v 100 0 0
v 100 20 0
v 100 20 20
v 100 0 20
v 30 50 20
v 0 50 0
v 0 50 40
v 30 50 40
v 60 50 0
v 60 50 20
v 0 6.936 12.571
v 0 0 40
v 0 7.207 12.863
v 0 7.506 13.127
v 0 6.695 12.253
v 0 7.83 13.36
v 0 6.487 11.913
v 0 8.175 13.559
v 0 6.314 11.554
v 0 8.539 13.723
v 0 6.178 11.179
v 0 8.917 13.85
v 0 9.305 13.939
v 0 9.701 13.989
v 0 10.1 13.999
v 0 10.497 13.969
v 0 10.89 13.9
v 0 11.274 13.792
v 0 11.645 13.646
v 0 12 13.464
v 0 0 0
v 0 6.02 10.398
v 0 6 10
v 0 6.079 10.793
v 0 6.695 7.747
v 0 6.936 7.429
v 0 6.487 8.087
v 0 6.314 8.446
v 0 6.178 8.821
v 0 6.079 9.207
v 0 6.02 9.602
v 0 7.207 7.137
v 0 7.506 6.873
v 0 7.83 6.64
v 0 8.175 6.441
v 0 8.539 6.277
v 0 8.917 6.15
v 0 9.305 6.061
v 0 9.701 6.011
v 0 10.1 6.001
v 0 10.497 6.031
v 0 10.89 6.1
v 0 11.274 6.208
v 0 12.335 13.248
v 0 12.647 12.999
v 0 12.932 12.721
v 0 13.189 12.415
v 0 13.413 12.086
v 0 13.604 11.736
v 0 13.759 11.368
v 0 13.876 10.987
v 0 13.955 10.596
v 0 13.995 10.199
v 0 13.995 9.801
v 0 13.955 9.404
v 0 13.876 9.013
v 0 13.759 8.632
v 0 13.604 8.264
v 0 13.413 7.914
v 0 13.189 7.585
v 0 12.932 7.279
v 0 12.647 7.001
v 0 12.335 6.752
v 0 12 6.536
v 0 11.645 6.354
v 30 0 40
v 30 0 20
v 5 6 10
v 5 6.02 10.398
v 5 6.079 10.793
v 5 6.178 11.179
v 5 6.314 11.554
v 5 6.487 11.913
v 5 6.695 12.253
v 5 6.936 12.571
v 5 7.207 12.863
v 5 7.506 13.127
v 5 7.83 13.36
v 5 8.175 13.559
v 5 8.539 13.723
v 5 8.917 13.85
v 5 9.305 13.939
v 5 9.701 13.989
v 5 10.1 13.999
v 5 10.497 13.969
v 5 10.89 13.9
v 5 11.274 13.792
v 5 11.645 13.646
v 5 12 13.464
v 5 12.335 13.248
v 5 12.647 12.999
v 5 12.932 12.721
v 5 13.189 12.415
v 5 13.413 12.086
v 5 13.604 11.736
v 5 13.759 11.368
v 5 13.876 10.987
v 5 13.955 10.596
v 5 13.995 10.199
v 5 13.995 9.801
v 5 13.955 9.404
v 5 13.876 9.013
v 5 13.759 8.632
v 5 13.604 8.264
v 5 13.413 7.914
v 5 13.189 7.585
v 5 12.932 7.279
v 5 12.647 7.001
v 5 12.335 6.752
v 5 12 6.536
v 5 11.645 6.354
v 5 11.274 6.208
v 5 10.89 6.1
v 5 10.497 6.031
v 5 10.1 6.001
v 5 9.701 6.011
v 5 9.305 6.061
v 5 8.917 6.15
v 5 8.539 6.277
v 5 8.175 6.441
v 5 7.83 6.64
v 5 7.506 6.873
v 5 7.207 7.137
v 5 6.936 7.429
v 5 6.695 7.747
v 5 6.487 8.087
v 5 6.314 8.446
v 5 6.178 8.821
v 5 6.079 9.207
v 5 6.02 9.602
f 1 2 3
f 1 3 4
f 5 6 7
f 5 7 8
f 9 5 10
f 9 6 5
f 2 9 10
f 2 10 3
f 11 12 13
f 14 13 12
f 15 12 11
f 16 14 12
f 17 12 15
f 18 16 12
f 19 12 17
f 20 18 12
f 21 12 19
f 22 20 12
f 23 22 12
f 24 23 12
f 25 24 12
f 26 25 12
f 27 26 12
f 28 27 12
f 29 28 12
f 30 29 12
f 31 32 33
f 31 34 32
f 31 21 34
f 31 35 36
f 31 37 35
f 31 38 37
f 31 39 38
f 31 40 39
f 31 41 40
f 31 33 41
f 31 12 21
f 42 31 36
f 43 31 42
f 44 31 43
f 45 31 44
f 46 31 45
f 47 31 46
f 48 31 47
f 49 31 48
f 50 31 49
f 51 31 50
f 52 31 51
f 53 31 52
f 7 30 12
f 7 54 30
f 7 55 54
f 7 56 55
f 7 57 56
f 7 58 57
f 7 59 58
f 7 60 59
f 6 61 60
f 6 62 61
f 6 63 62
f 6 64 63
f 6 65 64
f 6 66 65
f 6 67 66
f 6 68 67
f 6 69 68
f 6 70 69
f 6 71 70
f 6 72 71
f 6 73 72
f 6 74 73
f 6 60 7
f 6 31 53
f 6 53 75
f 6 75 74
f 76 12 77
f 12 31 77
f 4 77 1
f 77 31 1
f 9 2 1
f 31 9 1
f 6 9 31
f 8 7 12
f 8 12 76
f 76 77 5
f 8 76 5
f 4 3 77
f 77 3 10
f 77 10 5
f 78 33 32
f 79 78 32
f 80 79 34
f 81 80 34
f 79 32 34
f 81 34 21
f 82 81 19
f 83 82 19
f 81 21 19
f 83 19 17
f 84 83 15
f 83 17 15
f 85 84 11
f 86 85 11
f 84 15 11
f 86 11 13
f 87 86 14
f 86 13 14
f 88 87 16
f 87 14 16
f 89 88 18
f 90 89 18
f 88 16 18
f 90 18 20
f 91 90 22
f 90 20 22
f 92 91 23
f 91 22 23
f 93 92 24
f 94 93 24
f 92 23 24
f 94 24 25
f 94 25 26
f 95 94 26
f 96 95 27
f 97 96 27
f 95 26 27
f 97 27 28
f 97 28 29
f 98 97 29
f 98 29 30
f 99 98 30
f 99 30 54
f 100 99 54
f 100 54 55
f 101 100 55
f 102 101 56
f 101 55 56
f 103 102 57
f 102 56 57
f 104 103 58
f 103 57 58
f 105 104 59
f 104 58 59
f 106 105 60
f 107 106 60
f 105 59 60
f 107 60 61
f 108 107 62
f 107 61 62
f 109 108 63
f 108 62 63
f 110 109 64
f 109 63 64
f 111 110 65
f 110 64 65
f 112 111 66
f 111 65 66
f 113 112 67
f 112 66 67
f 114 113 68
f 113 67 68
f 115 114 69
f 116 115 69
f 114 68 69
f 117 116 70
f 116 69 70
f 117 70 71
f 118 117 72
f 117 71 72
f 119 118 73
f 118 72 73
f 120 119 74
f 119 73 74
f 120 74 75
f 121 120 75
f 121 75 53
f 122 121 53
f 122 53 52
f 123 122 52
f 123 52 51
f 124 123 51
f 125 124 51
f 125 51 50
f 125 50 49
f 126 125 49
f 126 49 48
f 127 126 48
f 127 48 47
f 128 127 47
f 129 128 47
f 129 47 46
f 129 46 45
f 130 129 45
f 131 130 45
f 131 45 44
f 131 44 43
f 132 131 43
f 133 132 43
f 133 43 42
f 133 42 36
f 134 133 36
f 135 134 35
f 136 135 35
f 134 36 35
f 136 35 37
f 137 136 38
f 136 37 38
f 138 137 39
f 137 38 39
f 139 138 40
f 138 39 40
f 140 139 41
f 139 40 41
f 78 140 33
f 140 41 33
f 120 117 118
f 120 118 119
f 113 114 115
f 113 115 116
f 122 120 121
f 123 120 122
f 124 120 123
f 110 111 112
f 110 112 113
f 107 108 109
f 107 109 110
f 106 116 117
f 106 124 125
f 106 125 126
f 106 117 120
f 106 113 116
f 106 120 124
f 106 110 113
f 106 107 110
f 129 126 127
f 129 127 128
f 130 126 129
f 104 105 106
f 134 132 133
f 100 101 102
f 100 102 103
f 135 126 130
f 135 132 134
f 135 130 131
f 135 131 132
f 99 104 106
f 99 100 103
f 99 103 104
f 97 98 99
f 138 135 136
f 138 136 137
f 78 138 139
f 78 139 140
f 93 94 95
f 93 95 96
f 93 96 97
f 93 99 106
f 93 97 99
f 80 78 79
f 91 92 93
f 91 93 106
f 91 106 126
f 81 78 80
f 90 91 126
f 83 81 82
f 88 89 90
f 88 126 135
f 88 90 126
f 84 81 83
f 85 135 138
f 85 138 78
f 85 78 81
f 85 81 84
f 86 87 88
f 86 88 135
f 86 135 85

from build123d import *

# Parameters (mm, degrees)
PAD_DEPTH    = 20
SKETCH001_W  = 30
SKETCH001_H  = 50
PAD001_DEPTH = 20
SKETCH004_R  = 4
POCKET_DEPTH = 5


with BuildPart() as part:
    # Sketch → Pad (new body)
    with BuildSketch(Plane.XY):
        Polygon((0, 0), (0, 50), (60, 50), (100, 20), (100, 0), align=None)
    extrude(amount=PAD_DEPTH)

    # Sketch001 (on Face7 of Pad) → Pad001 (join)
    with BuildSketch(Plane.XY.offset(20)):
        with Locations((15, 25)):
            Rectangle(SKETCH001_W, SKETCH001_H)
    extrude(amount=PAD001_DEPTH)

    # Sketch004 (on Face7 of Pad001) → Pocket (cut)
    with BuildSketch(Plane(origin=(0, 0, 0), x_dir=(0, -1, 0), z_dir=(-1, 0, 0))):
        with Locations((-10, 10)):
            Circle(SKETCH004_R)
    extrude(amount=-POCKET_DEPTH, mode=Mode.SUBTRACT)


solid = part.part
